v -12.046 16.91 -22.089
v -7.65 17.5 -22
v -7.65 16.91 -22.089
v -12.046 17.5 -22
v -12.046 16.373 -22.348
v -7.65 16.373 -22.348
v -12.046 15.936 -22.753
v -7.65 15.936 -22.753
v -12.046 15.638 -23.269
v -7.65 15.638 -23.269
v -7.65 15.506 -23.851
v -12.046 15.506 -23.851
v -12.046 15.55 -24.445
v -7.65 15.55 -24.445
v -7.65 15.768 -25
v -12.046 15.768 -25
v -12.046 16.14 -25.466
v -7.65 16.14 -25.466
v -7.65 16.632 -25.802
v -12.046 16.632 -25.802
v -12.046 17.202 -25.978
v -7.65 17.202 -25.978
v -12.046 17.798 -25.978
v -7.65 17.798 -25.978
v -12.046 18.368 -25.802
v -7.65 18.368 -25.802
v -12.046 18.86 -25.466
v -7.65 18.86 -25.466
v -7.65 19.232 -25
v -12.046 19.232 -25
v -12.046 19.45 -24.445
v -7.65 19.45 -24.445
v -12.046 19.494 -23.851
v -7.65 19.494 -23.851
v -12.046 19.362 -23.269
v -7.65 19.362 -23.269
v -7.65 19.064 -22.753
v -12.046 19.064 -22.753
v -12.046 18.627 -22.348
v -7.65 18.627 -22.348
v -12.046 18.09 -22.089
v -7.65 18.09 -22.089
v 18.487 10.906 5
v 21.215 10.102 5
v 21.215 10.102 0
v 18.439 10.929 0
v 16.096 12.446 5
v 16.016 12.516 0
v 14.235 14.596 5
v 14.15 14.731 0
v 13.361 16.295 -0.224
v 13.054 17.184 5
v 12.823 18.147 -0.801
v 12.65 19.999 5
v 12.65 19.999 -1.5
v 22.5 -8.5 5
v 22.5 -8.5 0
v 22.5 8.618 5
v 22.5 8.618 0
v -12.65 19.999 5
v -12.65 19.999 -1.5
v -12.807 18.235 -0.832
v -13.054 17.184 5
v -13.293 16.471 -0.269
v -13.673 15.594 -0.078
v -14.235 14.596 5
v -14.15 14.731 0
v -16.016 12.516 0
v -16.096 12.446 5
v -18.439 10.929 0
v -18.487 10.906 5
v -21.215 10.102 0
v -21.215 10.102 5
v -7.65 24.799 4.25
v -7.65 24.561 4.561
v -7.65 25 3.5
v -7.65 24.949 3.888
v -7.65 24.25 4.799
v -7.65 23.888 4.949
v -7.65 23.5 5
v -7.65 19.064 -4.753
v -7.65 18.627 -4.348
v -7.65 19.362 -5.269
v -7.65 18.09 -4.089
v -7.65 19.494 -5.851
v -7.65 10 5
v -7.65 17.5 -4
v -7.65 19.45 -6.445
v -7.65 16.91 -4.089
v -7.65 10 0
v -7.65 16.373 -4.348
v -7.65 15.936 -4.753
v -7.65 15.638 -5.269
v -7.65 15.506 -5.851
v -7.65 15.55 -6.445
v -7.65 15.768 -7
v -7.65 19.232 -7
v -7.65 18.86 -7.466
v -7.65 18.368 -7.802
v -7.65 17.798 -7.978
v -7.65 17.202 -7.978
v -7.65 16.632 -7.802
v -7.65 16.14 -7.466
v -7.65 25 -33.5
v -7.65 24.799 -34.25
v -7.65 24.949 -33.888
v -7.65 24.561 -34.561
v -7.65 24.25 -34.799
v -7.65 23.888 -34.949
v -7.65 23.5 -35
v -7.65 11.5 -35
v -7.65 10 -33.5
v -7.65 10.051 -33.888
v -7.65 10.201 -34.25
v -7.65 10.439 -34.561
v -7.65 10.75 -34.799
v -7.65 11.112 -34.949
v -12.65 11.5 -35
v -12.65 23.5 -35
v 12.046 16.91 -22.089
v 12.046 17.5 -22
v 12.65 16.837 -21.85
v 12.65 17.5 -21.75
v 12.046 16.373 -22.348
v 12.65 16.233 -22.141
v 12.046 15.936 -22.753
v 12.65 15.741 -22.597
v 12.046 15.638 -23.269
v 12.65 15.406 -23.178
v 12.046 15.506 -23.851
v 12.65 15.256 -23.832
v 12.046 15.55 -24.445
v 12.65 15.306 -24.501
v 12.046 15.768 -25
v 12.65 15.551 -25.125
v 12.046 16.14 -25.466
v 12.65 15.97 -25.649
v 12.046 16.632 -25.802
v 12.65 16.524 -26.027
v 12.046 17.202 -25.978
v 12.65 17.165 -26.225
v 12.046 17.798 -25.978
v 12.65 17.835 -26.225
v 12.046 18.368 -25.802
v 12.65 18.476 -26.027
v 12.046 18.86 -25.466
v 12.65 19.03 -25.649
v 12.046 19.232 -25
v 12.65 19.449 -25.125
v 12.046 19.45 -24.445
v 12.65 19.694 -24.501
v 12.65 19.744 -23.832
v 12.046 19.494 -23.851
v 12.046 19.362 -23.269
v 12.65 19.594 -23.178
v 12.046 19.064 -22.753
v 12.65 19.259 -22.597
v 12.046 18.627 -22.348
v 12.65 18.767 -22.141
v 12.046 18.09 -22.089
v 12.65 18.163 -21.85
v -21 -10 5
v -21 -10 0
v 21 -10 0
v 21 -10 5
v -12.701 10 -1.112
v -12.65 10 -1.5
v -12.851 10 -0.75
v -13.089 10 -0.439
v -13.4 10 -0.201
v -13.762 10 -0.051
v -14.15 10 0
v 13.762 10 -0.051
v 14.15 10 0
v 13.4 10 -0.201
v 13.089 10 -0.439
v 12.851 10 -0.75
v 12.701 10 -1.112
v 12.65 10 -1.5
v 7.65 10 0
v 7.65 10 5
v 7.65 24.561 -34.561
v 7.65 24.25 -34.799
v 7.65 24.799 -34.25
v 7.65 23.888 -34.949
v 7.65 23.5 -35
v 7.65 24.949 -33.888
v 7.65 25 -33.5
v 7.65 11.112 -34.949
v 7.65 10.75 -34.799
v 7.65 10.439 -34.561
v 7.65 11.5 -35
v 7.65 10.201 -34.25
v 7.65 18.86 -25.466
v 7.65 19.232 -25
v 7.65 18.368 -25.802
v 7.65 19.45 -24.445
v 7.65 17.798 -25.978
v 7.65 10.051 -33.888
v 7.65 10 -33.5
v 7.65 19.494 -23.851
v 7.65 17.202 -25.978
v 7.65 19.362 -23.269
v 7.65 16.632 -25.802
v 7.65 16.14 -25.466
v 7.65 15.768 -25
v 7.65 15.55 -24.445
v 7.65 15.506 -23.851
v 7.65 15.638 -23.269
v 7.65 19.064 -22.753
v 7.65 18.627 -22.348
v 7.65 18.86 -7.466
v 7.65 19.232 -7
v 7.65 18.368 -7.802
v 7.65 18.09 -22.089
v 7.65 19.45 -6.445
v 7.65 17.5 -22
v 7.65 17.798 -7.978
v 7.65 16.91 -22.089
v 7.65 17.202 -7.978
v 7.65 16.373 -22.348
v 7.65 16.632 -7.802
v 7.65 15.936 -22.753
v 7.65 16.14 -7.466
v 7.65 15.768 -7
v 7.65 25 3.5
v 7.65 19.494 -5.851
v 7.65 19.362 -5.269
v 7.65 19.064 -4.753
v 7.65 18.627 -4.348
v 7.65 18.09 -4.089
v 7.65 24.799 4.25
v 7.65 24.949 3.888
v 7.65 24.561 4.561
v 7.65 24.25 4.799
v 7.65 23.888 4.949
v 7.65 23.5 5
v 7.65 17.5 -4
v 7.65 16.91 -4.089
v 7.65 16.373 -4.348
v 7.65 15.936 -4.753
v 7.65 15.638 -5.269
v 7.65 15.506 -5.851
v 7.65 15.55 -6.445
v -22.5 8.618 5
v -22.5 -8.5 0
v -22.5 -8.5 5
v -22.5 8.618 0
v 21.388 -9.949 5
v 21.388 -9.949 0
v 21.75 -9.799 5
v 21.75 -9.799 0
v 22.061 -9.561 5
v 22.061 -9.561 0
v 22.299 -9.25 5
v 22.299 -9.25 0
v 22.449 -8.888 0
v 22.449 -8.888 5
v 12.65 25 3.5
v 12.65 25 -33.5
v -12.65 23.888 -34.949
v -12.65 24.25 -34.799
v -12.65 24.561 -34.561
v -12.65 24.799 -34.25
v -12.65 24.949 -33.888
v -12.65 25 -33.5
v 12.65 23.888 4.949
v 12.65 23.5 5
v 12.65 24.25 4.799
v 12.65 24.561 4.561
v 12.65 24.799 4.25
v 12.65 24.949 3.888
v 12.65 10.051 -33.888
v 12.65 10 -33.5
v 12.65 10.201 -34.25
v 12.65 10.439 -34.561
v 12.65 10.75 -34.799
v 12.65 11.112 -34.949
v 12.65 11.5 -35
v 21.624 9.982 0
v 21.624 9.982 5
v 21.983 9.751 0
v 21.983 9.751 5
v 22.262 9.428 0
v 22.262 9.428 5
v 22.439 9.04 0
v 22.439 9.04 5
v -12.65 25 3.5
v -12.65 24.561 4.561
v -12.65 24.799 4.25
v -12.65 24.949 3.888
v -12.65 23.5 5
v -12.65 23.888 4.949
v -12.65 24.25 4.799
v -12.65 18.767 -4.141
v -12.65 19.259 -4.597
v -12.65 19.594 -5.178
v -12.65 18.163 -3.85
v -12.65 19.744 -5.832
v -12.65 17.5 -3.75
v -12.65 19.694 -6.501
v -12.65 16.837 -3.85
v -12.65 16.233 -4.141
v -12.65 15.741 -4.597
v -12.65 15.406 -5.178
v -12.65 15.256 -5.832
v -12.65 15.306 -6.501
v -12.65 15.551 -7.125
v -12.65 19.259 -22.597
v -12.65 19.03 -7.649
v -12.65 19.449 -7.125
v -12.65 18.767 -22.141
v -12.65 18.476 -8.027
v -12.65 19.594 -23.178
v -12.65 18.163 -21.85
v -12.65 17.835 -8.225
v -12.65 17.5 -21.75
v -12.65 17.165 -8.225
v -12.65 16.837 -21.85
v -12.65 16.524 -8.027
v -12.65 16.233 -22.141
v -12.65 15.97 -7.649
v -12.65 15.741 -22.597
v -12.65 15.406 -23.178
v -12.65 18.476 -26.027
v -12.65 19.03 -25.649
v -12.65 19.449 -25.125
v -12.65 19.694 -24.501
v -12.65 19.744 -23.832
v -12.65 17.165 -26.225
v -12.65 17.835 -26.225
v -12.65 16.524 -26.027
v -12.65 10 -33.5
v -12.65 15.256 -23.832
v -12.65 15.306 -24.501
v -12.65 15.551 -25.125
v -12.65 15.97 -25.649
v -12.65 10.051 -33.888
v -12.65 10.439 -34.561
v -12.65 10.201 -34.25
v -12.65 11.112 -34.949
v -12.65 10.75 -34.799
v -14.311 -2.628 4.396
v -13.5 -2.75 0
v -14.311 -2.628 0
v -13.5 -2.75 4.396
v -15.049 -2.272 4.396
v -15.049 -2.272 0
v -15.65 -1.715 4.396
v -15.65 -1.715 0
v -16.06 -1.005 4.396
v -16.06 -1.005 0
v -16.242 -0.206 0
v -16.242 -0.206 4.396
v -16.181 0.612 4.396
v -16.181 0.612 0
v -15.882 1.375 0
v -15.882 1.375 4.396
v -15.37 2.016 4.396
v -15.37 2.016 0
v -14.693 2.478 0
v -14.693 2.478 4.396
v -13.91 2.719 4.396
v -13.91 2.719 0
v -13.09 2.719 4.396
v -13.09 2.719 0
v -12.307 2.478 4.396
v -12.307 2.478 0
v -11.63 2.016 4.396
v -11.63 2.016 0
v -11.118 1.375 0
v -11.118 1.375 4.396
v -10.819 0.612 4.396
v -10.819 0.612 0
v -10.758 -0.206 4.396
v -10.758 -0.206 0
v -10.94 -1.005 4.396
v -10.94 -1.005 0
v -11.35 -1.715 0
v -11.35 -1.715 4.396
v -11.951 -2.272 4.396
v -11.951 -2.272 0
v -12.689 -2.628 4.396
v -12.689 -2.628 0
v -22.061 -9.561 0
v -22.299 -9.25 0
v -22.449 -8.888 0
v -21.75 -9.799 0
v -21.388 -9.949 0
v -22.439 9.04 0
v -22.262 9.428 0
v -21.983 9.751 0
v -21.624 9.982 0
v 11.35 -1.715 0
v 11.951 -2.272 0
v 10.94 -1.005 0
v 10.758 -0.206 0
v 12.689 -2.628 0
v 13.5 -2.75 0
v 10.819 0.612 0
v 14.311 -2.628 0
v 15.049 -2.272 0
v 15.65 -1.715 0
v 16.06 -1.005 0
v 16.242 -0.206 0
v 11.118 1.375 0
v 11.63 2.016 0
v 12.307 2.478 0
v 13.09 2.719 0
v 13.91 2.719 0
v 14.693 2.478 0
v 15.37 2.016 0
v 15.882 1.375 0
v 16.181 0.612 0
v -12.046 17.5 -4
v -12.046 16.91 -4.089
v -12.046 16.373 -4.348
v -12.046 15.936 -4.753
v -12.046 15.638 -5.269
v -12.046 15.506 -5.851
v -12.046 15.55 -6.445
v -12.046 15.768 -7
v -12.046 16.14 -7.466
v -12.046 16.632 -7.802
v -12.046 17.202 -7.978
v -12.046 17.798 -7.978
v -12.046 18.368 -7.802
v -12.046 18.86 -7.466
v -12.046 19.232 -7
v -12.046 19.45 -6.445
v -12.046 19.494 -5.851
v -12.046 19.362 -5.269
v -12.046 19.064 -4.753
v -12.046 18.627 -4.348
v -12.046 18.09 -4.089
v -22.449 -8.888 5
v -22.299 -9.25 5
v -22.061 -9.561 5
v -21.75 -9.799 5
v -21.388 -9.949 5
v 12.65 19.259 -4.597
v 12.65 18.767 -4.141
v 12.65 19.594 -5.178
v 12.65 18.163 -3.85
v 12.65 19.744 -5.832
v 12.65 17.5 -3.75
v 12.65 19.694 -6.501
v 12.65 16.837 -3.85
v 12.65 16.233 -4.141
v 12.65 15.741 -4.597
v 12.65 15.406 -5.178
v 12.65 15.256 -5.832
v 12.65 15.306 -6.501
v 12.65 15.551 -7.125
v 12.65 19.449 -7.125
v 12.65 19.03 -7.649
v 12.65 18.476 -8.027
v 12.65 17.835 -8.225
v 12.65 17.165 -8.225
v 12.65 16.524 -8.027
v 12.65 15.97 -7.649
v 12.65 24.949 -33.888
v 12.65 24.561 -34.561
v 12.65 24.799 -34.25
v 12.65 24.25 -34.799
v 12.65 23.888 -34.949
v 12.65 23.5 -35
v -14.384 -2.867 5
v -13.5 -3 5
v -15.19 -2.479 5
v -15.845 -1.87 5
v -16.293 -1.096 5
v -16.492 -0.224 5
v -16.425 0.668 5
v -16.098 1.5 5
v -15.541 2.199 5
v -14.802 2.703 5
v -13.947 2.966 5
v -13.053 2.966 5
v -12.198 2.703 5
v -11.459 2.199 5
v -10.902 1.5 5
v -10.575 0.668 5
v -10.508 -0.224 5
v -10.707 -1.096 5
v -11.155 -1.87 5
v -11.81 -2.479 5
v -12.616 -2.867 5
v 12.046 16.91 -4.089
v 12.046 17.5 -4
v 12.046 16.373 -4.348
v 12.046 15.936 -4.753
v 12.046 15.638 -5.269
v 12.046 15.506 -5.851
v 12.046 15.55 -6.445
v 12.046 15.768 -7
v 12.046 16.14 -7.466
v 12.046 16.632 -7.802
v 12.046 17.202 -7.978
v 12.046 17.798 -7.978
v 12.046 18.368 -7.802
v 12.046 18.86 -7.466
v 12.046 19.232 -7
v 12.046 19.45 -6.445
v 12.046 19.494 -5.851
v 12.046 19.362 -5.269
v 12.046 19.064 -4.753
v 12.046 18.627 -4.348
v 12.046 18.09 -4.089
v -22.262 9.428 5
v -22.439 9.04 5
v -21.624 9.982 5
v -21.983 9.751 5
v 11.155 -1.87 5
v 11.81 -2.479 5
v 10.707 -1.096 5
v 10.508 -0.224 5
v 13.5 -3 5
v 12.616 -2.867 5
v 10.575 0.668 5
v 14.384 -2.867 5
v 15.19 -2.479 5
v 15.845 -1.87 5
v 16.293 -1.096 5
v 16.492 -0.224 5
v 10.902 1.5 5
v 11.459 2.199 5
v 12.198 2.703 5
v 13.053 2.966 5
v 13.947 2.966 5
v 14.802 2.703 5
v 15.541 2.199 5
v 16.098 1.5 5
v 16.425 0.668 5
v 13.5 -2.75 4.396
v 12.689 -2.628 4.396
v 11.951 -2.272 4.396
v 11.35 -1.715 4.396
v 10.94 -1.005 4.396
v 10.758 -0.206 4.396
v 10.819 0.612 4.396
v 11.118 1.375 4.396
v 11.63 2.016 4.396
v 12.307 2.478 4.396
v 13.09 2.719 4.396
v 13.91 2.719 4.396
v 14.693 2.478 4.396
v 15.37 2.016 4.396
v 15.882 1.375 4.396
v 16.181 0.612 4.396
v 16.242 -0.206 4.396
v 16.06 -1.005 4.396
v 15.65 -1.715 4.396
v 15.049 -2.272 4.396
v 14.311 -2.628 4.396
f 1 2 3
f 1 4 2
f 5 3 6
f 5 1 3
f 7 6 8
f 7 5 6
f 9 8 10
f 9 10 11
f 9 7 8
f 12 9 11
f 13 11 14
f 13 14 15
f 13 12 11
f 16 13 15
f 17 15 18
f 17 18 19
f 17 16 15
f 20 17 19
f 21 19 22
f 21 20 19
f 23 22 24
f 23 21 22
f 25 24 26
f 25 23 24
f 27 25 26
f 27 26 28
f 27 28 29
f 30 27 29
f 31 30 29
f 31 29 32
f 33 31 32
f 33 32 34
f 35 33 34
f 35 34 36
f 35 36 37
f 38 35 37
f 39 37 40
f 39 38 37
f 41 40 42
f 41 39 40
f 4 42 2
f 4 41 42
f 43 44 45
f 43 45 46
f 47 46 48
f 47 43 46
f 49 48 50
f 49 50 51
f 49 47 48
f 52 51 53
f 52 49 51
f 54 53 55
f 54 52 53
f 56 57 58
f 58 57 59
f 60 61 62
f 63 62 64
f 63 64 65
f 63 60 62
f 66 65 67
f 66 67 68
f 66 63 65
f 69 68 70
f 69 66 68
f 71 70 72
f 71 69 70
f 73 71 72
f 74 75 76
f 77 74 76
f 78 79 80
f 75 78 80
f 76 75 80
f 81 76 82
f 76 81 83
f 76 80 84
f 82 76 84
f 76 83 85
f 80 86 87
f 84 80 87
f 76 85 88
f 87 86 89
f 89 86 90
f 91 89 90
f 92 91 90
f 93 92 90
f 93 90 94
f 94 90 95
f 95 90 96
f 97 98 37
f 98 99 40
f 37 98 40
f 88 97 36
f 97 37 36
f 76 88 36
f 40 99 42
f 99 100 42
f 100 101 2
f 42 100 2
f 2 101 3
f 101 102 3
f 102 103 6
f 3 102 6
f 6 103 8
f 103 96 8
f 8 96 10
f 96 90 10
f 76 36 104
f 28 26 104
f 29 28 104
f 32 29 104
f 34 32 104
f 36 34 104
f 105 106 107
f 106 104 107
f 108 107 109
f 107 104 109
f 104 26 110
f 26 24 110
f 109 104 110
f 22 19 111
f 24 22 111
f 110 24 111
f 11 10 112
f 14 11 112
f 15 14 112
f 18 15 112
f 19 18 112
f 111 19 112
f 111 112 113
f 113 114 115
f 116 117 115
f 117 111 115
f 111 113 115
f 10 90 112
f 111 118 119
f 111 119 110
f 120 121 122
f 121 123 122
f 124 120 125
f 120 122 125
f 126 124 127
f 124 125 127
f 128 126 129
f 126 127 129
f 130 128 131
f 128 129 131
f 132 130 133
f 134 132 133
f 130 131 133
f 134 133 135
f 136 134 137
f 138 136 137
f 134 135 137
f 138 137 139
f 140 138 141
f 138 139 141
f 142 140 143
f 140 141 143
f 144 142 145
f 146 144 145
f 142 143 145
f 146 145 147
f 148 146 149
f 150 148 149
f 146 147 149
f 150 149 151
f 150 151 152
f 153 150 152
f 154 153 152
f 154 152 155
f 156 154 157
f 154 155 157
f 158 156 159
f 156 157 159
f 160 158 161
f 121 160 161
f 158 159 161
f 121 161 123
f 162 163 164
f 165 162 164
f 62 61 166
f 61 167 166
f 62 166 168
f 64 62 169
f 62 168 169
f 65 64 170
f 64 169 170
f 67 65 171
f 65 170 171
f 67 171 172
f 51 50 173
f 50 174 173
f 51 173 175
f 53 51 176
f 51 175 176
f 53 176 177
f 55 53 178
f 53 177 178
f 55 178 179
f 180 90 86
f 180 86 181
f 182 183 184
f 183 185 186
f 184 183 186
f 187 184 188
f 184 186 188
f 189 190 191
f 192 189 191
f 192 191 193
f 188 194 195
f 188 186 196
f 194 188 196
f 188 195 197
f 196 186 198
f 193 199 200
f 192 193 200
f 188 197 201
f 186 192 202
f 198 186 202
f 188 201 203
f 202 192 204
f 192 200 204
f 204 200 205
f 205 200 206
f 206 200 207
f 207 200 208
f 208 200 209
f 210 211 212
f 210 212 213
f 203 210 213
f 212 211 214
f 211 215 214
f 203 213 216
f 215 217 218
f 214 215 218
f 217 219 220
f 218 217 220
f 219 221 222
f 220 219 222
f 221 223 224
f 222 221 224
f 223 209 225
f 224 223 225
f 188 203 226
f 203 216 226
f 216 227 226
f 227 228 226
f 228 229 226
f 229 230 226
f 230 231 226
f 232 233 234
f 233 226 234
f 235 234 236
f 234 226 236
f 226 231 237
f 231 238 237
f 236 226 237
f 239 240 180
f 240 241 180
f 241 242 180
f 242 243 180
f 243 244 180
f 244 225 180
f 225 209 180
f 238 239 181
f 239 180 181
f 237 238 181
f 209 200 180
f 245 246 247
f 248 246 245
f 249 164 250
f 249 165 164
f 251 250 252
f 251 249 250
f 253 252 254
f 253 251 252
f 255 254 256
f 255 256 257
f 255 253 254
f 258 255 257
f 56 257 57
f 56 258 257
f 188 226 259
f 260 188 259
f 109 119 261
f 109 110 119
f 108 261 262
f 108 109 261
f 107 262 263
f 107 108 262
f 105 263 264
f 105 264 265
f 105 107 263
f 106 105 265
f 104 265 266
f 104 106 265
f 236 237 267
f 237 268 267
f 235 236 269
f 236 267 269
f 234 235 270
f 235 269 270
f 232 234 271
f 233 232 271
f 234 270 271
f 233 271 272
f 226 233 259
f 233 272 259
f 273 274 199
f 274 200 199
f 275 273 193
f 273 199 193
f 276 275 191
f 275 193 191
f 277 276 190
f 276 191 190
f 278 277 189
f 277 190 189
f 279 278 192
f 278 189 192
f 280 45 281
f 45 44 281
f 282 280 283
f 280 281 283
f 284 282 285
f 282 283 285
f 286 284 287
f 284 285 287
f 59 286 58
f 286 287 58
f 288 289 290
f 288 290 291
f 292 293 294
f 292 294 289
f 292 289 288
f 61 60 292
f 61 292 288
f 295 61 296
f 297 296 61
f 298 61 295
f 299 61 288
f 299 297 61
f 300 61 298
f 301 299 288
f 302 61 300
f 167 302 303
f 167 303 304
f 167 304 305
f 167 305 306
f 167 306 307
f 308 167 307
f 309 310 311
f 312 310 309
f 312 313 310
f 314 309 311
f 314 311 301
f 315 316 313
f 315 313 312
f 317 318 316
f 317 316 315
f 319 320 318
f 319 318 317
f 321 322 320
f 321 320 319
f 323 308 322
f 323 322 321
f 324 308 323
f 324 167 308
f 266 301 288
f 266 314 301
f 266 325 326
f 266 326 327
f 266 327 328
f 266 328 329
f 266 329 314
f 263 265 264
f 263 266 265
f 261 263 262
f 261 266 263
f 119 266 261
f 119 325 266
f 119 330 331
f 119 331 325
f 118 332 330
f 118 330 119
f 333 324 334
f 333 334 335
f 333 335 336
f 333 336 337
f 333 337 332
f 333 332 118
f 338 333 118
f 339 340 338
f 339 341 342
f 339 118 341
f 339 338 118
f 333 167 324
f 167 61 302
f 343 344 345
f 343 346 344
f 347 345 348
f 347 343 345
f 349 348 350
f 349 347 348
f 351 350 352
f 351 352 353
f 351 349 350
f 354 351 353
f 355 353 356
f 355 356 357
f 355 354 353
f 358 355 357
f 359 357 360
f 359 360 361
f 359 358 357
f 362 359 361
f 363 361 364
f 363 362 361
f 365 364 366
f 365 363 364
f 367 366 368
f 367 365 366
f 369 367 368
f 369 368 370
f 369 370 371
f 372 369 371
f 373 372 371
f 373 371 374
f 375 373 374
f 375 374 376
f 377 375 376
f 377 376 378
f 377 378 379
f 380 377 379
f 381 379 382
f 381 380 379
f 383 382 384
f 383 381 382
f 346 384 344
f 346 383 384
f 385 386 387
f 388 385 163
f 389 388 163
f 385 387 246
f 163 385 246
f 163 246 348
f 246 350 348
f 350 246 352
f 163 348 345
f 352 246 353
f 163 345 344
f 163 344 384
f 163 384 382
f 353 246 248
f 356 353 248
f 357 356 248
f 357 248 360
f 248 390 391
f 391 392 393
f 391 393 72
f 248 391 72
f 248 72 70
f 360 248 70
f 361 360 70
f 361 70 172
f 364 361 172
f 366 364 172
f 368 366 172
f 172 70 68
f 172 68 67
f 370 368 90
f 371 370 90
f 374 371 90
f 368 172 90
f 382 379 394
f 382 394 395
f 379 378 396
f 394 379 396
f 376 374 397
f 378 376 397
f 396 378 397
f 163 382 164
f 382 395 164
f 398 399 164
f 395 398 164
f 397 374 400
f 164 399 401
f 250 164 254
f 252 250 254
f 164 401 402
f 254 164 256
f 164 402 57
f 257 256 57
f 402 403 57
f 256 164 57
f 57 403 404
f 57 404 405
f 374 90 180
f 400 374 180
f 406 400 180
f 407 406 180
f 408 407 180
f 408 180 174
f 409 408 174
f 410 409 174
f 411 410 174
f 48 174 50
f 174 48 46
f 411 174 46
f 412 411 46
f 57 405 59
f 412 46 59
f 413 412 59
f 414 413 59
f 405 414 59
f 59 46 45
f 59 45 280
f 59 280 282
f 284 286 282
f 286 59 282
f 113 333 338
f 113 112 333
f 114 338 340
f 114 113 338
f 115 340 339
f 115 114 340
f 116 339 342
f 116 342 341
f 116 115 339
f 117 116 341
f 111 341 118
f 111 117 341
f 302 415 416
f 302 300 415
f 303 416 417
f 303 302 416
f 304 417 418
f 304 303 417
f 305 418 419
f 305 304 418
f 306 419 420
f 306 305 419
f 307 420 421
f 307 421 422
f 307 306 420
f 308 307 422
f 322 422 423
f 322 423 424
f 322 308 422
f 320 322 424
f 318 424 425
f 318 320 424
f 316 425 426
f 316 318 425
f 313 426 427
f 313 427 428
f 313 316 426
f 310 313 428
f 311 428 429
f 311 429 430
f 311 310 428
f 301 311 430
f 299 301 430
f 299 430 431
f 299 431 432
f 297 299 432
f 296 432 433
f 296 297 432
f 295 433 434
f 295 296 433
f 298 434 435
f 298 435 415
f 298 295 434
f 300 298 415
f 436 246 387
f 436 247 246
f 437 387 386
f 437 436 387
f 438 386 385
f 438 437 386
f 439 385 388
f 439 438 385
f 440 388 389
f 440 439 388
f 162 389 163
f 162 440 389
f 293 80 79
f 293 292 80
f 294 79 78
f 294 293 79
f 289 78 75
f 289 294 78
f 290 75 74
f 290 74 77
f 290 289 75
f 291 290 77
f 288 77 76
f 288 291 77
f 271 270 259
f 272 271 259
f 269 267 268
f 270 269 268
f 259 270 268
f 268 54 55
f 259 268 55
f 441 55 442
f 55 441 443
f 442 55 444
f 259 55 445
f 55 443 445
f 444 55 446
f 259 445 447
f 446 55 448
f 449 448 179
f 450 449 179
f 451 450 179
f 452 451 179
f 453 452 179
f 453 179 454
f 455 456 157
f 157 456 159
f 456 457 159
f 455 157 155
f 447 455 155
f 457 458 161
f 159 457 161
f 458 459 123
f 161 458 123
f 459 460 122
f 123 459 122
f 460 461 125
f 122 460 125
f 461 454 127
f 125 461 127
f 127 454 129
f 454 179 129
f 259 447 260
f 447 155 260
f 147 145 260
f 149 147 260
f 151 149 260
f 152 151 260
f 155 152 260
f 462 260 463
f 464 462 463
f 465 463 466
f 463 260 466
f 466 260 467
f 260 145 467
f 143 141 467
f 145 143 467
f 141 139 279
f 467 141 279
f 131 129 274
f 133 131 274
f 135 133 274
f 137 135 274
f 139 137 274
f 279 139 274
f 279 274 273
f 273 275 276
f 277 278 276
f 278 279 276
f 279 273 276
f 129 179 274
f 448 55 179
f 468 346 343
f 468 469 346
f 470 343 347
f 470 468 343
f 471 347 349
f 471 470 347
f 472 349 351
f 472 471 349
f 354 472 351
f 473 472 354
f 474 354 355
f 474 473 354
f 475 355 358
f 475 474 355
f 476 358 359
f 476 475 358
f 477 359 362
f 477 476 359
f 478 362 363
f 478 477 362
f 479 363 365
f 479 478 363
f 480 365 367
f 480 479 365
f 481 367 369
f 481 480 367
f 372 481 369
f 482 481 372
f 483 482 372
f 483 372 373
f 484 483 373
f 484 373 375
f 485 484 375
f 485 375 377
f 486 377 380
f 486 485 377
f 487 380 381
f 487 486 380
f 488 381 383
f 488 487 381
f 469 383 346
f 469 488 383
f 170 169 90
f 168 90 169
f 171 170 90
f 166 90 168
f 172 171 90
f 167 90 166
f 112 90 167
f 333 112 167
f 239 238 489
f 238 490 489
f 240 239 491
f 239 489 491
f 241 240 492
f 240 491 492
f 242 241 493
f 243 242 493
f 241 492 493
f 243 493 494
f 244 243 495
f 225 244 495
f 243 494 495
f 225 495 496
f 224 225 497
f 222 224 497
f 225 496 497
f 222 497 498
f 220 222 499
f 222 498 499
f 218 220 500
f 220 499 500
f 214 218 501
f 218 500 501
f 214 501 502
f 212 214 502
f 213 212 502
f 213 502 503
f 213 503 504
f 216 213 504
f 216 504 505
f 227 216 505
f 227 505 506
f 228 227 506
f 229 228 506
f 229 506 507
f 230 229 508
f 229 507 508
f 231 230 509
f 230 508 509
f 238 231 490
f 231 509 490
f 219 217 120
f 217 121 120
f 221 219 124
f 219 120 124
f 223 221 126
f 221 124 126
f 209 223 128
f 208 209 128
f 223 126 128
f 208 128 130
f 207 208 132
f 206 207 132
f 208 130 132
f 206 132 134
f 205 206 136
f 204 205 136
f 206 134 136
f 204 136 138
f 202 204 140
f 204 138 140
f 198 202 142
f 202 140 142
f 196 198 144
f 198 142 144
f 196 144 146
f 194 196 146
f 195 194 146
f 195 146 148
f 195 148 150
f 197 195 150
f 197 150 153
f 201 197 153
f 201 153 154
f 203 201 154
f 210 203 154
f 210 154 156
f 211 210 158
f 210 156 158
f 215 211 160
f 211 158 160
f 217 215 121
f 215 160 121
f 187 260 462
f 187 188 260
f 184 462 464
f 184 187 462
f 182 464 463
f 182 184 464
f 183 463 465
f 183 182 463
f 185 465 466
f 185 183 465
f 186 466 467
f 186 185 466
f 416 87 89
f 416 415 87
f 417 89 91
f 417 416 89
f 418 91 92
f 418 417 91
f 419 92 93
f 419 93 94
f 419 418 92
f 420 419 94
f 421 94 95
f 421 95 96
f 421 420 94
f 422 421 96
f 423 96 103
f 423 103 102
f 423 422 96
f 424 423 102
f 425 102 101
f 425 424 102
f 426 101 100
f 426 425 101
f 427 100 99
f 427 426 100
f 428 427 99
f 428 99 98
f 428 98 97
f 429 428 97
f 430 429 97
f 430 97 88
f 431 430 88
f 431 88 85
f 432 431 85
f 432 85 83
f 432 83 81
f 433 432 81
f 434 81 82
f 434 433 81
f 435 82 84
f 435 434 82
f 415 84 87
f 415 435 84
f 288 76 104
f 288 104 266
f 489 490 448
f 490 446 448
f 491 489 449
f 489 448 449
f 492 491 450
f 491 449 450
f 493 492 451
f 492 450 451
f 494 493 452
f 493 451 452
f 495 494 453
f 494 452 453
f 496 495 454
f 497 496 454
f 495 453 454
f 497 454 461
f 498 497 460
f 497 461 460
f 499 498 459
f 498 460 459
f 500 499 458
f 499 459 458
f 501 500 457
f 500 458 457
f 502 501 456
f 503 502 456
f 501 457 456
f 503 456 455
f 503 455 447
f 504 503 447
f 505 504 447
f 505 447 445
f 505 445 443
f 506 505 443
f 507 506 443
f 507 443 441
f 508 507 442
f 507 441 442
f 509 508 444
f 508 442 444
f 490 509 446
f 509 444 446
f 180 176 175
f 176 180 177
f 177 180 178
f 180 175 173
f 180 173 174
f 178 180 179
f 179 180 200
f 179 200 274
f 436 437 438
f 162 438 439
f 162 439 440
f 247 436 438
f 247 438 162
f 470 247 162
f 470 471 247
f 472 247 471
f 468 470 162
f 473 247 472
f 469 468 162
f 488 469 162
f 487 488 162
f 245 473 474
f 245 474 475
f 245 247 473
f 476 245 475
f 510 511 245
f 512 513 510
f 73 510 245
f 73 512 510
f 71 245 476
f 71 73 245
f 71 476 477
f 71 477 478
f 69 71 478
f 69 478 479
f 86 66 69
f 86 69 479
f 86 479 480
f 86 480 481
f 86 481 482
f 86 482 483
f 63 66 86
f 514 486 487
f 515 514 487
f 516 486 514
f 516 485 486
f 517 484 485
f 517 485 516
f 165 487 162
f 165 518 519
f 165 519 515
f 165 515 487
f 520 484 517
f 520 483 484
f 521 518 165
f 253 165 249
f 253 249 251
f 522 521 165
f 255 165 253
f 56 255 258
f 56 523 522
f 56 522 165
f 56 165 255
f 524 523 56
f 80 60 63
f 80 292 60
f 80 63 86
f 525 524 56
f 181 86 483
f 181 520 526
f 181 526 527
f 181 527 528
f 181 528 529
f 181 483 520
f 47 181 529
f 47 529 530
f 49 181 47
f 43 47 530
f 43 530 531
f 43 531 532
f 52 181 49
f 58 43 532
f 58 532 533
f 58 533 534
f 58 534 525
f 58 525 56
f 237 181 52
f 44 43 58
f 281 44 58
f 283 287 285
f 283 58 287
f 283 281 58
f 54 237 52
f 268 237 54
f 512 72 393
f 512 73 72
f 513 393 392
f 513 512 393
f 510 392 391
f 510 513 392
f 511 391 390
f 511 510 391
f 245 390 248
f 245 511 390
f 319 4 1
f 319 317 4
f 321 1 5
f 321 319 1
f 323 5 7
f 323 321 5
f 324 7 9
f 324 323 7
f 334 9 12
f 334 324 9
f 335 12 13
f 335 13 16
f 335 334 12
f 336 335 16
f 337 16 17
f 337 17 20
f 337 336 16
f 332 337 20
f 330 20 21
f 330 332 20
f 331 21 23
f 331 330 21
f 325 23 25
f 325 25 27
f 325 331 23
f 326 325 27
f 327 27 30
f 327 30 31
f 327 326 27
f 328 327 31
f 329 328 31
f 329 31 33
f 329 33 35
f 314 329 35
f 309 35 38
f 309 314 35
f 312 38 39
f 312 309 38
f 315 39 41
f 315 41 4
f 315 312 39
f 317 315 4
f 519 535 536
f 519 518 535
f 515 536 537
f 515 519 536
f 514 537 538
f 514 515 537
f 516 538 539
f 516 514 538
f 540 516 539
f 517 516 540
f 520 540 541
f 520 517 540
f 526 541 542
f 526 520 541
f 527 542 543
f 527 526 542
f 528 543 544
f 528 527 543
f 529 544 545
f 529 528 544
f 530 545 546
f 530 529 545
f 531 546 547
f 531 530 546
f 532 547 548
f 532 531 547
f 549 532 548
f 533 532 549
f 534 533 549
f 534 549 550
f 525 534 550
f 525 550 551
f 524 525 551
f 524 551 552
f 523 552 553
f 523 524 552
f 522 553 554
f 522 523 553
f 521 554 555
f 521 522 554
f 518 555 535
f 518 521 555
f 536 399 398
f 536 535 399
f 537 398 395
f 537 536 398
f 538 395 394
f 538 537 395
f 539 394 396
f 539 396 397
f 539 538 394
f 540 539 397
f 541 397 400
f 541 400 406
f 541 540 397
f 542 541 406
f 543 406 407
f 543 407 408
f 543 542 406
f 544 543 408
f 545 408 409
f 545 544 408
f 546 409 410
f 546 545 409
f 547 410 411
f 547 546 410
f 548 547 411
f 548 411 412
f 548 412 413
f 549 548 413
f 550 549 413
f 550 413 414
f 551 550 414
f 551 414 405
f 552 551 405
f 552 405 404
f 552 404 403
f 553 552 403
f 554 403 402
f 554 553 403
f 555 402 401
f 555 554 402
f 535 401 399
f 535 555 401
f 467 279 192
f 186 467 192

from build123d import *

# Parameters (mm, degrees)
SKETCH1_W                           = 45
SKETCH1_H                           = 20
BOSS_EXTRUDE1_DEPTH                 = 5
BOSS_EXTRUDE2_DEPTH                 = 15
F_4_0_4_DIAMETER_HOLE1_AT_2_COUNT   = 2
F_4_0_4_DIAMETER_HOLE1_AT_2_PITCH   = 18
F_5_5_5_5_DIAMETER_HOLE2_AT_2_COUNT = 2
F_5_5_5_5_DIAMETER_HOLE2_AT_2_PITCH = 27
FILLET1_R                           = 10
FILLET2_R                           = 1.5


with BuildPart() as part:
    # Sketch1 → Boss-Extrude1 (new body)
    with BuildSketch(Plane.XY):
        Rectangle(SKETCH1_W, SKETCH1_H)
    extrude(amount=BOSS_EXTRUDE1_DEPTH)

    # Sketch3 → Boss-Extrude2 (add)
    with BuildSketch(Plane(origin=(0, 10, 0), x_dir=(1, 0, 0), z_dir=(0, 1, 0))):
        Polygon((-7.65, 0), (-7.65, -5), (-12.65, -5), (-12.65, 35), (-7.65, 35), align=None)
        Polygon((7.65, -5), (12.65, -5), (12.65, 35), (7.65, 35), (7.65, 0), align=None)
    extrude(amount=BOSS_EXTRUDE2_DEPTH)

    # Sketch8 → Ø4.0 (4) Diameter Hole1 (revolve, cut)
    with BuildSketch(Plane(origin=(-12.65, 17.5, -24), x_dir=(0, 0, 1), z_dir=(0, 1, 0))):
        Polygon((0, 0), (0, 5), (2, 5), (2, 0.603553391), (2.25, 0), align=None)
    f_4_0_4_diameter_hole1 = revolve(axis=Axis((-19, 17.5, -24), (1, 0, 0)), mode=Mode.SUBTRACT)

    # Ø4.0 (4) Diameter Hole1 at 2: Ø4.0 (4) Diameter Hole1 ×2
    with Locations(*[(0, 0, i * F_4_0_4_DIAMETER_HOLE1_AT_2_PITCH) for i in range(1, F_4_0_4_DIAMETER_HOLE1_AT_2_COUNT)]):
        add(f_4_0_4_diameter_hole1, mode=Mode.SUBTRACT)

    # Mirror3: Ø4.0 (4) Diameter Hole1 across plane
    add(f_4_0_4_diameter_hole1.mirror(Plane(origin=(0, 0, 0), x_dir=(0, 0, 1), z_dir=(1, 0, 0))), mode=Mode.SUBTRACT)

    # Mirror3 copy 1 sketch → Mirror3 copy 1 (revolve, cut)
    with BuildSketch(Plane(origin=(12.65, 17.5, -6), x_dir=(0, 0, 1), z_dir=(0, 1, 0))):
        Polygon((0, 0), (0, -5), (2, -5), (2, -0.603553391), (2.25, 0), align=None)
    revolve(axis=Axis((19, 17.5, -6), (1, 0, 0)), mode=Mode.SUBTRACT)

    # Sketch12 → Ø5.5 (5.5) Diameter Hole2 (revolve, cut)
    with BuildSketch(Plane(origin=(13.5, 0, 5), x_dir=(0, -1, 0), z_dir=(1, 0, 0))):
        Polygon((0, 0), (0, 5), (2.75, 5), (2.75, 0.603553391), (3, 0), align=None)
    f_5_5_5_5_diameter_hole2 = revolve(axis=Axis((13.5, 0, 11.35), (0, 0, -1)), mode=Mode.SUBTRACT)

    # Ø5.5 (5.5) Diameter Hole2 at 2: Ø5.5 (5.5) Diameter Hole2 ×2
    with Locations(*[(-i * F_5_5_5_5_DIAMETER_HOLE2_AT_2_PITCH, 0, 0) for i in range(1, F_5_5_5_5_DIAMETER_HOLE2_AT_2_COUNT)]):
        add(f_5_5_5_5_diameter_hole2, mode=Mode.SUBTRACT)

    # Fillet1
    # the kernel refuses this fillet: 10 mm, written as the material it adds along each edge
    with BuildSketch(Plane(origin=(12.65, 10, 5), x_dir=(1, 0, 0), z_dir=(0, 0, -1))) as fillet1_piece_1:
        with BuildLine():
            CenterArc((10, -9.998874937), FILLET1_R, 90.859468925, 89.140531075)
            Line((0, -9.998874937), (0, 0))
            Line((0, 0), (9.85, 0))
        make_face()
    extrude(amount=5)
    with BuildSketch(Plane(origin=(-12.65, 10, 5), x_dir=(-1, 0, 0), z_dir=(0, 0, -1))) as fillet1_piece_2:
        with BuildLine():
            CenterArc((10, 9.998874937), FILLET1_R, 180, 89.140531075)
            Line((0, 9.998874937), (0, 0))
            Line((0, 0), (9.85, 0))
        make_face()
    extrude(amount=5)

    # Fillet2
    fillet2_edges = [part.edges().sort_by_distance(p)[0] for p in [
        (-10.15, 10, -35),
        (-10.15, 25, -35),
        (-10.15, 25, 5),
        (10.15, 10, -35),
        (10.15, 25, 5),
        (10.15, 25, -35),
        (22.5, -10, 2.5),
        (-22.5, -10, 2.5),
        (-22.5, 10, 2.5),
        (22.5, 10, 2.5),
        (12.65, 14.999437468, 0),
        (-12.65, 14.999437468, 0),
    ]]
    fillet(fillet2_edges, radius=FILLET2_R)


solid = part.part
